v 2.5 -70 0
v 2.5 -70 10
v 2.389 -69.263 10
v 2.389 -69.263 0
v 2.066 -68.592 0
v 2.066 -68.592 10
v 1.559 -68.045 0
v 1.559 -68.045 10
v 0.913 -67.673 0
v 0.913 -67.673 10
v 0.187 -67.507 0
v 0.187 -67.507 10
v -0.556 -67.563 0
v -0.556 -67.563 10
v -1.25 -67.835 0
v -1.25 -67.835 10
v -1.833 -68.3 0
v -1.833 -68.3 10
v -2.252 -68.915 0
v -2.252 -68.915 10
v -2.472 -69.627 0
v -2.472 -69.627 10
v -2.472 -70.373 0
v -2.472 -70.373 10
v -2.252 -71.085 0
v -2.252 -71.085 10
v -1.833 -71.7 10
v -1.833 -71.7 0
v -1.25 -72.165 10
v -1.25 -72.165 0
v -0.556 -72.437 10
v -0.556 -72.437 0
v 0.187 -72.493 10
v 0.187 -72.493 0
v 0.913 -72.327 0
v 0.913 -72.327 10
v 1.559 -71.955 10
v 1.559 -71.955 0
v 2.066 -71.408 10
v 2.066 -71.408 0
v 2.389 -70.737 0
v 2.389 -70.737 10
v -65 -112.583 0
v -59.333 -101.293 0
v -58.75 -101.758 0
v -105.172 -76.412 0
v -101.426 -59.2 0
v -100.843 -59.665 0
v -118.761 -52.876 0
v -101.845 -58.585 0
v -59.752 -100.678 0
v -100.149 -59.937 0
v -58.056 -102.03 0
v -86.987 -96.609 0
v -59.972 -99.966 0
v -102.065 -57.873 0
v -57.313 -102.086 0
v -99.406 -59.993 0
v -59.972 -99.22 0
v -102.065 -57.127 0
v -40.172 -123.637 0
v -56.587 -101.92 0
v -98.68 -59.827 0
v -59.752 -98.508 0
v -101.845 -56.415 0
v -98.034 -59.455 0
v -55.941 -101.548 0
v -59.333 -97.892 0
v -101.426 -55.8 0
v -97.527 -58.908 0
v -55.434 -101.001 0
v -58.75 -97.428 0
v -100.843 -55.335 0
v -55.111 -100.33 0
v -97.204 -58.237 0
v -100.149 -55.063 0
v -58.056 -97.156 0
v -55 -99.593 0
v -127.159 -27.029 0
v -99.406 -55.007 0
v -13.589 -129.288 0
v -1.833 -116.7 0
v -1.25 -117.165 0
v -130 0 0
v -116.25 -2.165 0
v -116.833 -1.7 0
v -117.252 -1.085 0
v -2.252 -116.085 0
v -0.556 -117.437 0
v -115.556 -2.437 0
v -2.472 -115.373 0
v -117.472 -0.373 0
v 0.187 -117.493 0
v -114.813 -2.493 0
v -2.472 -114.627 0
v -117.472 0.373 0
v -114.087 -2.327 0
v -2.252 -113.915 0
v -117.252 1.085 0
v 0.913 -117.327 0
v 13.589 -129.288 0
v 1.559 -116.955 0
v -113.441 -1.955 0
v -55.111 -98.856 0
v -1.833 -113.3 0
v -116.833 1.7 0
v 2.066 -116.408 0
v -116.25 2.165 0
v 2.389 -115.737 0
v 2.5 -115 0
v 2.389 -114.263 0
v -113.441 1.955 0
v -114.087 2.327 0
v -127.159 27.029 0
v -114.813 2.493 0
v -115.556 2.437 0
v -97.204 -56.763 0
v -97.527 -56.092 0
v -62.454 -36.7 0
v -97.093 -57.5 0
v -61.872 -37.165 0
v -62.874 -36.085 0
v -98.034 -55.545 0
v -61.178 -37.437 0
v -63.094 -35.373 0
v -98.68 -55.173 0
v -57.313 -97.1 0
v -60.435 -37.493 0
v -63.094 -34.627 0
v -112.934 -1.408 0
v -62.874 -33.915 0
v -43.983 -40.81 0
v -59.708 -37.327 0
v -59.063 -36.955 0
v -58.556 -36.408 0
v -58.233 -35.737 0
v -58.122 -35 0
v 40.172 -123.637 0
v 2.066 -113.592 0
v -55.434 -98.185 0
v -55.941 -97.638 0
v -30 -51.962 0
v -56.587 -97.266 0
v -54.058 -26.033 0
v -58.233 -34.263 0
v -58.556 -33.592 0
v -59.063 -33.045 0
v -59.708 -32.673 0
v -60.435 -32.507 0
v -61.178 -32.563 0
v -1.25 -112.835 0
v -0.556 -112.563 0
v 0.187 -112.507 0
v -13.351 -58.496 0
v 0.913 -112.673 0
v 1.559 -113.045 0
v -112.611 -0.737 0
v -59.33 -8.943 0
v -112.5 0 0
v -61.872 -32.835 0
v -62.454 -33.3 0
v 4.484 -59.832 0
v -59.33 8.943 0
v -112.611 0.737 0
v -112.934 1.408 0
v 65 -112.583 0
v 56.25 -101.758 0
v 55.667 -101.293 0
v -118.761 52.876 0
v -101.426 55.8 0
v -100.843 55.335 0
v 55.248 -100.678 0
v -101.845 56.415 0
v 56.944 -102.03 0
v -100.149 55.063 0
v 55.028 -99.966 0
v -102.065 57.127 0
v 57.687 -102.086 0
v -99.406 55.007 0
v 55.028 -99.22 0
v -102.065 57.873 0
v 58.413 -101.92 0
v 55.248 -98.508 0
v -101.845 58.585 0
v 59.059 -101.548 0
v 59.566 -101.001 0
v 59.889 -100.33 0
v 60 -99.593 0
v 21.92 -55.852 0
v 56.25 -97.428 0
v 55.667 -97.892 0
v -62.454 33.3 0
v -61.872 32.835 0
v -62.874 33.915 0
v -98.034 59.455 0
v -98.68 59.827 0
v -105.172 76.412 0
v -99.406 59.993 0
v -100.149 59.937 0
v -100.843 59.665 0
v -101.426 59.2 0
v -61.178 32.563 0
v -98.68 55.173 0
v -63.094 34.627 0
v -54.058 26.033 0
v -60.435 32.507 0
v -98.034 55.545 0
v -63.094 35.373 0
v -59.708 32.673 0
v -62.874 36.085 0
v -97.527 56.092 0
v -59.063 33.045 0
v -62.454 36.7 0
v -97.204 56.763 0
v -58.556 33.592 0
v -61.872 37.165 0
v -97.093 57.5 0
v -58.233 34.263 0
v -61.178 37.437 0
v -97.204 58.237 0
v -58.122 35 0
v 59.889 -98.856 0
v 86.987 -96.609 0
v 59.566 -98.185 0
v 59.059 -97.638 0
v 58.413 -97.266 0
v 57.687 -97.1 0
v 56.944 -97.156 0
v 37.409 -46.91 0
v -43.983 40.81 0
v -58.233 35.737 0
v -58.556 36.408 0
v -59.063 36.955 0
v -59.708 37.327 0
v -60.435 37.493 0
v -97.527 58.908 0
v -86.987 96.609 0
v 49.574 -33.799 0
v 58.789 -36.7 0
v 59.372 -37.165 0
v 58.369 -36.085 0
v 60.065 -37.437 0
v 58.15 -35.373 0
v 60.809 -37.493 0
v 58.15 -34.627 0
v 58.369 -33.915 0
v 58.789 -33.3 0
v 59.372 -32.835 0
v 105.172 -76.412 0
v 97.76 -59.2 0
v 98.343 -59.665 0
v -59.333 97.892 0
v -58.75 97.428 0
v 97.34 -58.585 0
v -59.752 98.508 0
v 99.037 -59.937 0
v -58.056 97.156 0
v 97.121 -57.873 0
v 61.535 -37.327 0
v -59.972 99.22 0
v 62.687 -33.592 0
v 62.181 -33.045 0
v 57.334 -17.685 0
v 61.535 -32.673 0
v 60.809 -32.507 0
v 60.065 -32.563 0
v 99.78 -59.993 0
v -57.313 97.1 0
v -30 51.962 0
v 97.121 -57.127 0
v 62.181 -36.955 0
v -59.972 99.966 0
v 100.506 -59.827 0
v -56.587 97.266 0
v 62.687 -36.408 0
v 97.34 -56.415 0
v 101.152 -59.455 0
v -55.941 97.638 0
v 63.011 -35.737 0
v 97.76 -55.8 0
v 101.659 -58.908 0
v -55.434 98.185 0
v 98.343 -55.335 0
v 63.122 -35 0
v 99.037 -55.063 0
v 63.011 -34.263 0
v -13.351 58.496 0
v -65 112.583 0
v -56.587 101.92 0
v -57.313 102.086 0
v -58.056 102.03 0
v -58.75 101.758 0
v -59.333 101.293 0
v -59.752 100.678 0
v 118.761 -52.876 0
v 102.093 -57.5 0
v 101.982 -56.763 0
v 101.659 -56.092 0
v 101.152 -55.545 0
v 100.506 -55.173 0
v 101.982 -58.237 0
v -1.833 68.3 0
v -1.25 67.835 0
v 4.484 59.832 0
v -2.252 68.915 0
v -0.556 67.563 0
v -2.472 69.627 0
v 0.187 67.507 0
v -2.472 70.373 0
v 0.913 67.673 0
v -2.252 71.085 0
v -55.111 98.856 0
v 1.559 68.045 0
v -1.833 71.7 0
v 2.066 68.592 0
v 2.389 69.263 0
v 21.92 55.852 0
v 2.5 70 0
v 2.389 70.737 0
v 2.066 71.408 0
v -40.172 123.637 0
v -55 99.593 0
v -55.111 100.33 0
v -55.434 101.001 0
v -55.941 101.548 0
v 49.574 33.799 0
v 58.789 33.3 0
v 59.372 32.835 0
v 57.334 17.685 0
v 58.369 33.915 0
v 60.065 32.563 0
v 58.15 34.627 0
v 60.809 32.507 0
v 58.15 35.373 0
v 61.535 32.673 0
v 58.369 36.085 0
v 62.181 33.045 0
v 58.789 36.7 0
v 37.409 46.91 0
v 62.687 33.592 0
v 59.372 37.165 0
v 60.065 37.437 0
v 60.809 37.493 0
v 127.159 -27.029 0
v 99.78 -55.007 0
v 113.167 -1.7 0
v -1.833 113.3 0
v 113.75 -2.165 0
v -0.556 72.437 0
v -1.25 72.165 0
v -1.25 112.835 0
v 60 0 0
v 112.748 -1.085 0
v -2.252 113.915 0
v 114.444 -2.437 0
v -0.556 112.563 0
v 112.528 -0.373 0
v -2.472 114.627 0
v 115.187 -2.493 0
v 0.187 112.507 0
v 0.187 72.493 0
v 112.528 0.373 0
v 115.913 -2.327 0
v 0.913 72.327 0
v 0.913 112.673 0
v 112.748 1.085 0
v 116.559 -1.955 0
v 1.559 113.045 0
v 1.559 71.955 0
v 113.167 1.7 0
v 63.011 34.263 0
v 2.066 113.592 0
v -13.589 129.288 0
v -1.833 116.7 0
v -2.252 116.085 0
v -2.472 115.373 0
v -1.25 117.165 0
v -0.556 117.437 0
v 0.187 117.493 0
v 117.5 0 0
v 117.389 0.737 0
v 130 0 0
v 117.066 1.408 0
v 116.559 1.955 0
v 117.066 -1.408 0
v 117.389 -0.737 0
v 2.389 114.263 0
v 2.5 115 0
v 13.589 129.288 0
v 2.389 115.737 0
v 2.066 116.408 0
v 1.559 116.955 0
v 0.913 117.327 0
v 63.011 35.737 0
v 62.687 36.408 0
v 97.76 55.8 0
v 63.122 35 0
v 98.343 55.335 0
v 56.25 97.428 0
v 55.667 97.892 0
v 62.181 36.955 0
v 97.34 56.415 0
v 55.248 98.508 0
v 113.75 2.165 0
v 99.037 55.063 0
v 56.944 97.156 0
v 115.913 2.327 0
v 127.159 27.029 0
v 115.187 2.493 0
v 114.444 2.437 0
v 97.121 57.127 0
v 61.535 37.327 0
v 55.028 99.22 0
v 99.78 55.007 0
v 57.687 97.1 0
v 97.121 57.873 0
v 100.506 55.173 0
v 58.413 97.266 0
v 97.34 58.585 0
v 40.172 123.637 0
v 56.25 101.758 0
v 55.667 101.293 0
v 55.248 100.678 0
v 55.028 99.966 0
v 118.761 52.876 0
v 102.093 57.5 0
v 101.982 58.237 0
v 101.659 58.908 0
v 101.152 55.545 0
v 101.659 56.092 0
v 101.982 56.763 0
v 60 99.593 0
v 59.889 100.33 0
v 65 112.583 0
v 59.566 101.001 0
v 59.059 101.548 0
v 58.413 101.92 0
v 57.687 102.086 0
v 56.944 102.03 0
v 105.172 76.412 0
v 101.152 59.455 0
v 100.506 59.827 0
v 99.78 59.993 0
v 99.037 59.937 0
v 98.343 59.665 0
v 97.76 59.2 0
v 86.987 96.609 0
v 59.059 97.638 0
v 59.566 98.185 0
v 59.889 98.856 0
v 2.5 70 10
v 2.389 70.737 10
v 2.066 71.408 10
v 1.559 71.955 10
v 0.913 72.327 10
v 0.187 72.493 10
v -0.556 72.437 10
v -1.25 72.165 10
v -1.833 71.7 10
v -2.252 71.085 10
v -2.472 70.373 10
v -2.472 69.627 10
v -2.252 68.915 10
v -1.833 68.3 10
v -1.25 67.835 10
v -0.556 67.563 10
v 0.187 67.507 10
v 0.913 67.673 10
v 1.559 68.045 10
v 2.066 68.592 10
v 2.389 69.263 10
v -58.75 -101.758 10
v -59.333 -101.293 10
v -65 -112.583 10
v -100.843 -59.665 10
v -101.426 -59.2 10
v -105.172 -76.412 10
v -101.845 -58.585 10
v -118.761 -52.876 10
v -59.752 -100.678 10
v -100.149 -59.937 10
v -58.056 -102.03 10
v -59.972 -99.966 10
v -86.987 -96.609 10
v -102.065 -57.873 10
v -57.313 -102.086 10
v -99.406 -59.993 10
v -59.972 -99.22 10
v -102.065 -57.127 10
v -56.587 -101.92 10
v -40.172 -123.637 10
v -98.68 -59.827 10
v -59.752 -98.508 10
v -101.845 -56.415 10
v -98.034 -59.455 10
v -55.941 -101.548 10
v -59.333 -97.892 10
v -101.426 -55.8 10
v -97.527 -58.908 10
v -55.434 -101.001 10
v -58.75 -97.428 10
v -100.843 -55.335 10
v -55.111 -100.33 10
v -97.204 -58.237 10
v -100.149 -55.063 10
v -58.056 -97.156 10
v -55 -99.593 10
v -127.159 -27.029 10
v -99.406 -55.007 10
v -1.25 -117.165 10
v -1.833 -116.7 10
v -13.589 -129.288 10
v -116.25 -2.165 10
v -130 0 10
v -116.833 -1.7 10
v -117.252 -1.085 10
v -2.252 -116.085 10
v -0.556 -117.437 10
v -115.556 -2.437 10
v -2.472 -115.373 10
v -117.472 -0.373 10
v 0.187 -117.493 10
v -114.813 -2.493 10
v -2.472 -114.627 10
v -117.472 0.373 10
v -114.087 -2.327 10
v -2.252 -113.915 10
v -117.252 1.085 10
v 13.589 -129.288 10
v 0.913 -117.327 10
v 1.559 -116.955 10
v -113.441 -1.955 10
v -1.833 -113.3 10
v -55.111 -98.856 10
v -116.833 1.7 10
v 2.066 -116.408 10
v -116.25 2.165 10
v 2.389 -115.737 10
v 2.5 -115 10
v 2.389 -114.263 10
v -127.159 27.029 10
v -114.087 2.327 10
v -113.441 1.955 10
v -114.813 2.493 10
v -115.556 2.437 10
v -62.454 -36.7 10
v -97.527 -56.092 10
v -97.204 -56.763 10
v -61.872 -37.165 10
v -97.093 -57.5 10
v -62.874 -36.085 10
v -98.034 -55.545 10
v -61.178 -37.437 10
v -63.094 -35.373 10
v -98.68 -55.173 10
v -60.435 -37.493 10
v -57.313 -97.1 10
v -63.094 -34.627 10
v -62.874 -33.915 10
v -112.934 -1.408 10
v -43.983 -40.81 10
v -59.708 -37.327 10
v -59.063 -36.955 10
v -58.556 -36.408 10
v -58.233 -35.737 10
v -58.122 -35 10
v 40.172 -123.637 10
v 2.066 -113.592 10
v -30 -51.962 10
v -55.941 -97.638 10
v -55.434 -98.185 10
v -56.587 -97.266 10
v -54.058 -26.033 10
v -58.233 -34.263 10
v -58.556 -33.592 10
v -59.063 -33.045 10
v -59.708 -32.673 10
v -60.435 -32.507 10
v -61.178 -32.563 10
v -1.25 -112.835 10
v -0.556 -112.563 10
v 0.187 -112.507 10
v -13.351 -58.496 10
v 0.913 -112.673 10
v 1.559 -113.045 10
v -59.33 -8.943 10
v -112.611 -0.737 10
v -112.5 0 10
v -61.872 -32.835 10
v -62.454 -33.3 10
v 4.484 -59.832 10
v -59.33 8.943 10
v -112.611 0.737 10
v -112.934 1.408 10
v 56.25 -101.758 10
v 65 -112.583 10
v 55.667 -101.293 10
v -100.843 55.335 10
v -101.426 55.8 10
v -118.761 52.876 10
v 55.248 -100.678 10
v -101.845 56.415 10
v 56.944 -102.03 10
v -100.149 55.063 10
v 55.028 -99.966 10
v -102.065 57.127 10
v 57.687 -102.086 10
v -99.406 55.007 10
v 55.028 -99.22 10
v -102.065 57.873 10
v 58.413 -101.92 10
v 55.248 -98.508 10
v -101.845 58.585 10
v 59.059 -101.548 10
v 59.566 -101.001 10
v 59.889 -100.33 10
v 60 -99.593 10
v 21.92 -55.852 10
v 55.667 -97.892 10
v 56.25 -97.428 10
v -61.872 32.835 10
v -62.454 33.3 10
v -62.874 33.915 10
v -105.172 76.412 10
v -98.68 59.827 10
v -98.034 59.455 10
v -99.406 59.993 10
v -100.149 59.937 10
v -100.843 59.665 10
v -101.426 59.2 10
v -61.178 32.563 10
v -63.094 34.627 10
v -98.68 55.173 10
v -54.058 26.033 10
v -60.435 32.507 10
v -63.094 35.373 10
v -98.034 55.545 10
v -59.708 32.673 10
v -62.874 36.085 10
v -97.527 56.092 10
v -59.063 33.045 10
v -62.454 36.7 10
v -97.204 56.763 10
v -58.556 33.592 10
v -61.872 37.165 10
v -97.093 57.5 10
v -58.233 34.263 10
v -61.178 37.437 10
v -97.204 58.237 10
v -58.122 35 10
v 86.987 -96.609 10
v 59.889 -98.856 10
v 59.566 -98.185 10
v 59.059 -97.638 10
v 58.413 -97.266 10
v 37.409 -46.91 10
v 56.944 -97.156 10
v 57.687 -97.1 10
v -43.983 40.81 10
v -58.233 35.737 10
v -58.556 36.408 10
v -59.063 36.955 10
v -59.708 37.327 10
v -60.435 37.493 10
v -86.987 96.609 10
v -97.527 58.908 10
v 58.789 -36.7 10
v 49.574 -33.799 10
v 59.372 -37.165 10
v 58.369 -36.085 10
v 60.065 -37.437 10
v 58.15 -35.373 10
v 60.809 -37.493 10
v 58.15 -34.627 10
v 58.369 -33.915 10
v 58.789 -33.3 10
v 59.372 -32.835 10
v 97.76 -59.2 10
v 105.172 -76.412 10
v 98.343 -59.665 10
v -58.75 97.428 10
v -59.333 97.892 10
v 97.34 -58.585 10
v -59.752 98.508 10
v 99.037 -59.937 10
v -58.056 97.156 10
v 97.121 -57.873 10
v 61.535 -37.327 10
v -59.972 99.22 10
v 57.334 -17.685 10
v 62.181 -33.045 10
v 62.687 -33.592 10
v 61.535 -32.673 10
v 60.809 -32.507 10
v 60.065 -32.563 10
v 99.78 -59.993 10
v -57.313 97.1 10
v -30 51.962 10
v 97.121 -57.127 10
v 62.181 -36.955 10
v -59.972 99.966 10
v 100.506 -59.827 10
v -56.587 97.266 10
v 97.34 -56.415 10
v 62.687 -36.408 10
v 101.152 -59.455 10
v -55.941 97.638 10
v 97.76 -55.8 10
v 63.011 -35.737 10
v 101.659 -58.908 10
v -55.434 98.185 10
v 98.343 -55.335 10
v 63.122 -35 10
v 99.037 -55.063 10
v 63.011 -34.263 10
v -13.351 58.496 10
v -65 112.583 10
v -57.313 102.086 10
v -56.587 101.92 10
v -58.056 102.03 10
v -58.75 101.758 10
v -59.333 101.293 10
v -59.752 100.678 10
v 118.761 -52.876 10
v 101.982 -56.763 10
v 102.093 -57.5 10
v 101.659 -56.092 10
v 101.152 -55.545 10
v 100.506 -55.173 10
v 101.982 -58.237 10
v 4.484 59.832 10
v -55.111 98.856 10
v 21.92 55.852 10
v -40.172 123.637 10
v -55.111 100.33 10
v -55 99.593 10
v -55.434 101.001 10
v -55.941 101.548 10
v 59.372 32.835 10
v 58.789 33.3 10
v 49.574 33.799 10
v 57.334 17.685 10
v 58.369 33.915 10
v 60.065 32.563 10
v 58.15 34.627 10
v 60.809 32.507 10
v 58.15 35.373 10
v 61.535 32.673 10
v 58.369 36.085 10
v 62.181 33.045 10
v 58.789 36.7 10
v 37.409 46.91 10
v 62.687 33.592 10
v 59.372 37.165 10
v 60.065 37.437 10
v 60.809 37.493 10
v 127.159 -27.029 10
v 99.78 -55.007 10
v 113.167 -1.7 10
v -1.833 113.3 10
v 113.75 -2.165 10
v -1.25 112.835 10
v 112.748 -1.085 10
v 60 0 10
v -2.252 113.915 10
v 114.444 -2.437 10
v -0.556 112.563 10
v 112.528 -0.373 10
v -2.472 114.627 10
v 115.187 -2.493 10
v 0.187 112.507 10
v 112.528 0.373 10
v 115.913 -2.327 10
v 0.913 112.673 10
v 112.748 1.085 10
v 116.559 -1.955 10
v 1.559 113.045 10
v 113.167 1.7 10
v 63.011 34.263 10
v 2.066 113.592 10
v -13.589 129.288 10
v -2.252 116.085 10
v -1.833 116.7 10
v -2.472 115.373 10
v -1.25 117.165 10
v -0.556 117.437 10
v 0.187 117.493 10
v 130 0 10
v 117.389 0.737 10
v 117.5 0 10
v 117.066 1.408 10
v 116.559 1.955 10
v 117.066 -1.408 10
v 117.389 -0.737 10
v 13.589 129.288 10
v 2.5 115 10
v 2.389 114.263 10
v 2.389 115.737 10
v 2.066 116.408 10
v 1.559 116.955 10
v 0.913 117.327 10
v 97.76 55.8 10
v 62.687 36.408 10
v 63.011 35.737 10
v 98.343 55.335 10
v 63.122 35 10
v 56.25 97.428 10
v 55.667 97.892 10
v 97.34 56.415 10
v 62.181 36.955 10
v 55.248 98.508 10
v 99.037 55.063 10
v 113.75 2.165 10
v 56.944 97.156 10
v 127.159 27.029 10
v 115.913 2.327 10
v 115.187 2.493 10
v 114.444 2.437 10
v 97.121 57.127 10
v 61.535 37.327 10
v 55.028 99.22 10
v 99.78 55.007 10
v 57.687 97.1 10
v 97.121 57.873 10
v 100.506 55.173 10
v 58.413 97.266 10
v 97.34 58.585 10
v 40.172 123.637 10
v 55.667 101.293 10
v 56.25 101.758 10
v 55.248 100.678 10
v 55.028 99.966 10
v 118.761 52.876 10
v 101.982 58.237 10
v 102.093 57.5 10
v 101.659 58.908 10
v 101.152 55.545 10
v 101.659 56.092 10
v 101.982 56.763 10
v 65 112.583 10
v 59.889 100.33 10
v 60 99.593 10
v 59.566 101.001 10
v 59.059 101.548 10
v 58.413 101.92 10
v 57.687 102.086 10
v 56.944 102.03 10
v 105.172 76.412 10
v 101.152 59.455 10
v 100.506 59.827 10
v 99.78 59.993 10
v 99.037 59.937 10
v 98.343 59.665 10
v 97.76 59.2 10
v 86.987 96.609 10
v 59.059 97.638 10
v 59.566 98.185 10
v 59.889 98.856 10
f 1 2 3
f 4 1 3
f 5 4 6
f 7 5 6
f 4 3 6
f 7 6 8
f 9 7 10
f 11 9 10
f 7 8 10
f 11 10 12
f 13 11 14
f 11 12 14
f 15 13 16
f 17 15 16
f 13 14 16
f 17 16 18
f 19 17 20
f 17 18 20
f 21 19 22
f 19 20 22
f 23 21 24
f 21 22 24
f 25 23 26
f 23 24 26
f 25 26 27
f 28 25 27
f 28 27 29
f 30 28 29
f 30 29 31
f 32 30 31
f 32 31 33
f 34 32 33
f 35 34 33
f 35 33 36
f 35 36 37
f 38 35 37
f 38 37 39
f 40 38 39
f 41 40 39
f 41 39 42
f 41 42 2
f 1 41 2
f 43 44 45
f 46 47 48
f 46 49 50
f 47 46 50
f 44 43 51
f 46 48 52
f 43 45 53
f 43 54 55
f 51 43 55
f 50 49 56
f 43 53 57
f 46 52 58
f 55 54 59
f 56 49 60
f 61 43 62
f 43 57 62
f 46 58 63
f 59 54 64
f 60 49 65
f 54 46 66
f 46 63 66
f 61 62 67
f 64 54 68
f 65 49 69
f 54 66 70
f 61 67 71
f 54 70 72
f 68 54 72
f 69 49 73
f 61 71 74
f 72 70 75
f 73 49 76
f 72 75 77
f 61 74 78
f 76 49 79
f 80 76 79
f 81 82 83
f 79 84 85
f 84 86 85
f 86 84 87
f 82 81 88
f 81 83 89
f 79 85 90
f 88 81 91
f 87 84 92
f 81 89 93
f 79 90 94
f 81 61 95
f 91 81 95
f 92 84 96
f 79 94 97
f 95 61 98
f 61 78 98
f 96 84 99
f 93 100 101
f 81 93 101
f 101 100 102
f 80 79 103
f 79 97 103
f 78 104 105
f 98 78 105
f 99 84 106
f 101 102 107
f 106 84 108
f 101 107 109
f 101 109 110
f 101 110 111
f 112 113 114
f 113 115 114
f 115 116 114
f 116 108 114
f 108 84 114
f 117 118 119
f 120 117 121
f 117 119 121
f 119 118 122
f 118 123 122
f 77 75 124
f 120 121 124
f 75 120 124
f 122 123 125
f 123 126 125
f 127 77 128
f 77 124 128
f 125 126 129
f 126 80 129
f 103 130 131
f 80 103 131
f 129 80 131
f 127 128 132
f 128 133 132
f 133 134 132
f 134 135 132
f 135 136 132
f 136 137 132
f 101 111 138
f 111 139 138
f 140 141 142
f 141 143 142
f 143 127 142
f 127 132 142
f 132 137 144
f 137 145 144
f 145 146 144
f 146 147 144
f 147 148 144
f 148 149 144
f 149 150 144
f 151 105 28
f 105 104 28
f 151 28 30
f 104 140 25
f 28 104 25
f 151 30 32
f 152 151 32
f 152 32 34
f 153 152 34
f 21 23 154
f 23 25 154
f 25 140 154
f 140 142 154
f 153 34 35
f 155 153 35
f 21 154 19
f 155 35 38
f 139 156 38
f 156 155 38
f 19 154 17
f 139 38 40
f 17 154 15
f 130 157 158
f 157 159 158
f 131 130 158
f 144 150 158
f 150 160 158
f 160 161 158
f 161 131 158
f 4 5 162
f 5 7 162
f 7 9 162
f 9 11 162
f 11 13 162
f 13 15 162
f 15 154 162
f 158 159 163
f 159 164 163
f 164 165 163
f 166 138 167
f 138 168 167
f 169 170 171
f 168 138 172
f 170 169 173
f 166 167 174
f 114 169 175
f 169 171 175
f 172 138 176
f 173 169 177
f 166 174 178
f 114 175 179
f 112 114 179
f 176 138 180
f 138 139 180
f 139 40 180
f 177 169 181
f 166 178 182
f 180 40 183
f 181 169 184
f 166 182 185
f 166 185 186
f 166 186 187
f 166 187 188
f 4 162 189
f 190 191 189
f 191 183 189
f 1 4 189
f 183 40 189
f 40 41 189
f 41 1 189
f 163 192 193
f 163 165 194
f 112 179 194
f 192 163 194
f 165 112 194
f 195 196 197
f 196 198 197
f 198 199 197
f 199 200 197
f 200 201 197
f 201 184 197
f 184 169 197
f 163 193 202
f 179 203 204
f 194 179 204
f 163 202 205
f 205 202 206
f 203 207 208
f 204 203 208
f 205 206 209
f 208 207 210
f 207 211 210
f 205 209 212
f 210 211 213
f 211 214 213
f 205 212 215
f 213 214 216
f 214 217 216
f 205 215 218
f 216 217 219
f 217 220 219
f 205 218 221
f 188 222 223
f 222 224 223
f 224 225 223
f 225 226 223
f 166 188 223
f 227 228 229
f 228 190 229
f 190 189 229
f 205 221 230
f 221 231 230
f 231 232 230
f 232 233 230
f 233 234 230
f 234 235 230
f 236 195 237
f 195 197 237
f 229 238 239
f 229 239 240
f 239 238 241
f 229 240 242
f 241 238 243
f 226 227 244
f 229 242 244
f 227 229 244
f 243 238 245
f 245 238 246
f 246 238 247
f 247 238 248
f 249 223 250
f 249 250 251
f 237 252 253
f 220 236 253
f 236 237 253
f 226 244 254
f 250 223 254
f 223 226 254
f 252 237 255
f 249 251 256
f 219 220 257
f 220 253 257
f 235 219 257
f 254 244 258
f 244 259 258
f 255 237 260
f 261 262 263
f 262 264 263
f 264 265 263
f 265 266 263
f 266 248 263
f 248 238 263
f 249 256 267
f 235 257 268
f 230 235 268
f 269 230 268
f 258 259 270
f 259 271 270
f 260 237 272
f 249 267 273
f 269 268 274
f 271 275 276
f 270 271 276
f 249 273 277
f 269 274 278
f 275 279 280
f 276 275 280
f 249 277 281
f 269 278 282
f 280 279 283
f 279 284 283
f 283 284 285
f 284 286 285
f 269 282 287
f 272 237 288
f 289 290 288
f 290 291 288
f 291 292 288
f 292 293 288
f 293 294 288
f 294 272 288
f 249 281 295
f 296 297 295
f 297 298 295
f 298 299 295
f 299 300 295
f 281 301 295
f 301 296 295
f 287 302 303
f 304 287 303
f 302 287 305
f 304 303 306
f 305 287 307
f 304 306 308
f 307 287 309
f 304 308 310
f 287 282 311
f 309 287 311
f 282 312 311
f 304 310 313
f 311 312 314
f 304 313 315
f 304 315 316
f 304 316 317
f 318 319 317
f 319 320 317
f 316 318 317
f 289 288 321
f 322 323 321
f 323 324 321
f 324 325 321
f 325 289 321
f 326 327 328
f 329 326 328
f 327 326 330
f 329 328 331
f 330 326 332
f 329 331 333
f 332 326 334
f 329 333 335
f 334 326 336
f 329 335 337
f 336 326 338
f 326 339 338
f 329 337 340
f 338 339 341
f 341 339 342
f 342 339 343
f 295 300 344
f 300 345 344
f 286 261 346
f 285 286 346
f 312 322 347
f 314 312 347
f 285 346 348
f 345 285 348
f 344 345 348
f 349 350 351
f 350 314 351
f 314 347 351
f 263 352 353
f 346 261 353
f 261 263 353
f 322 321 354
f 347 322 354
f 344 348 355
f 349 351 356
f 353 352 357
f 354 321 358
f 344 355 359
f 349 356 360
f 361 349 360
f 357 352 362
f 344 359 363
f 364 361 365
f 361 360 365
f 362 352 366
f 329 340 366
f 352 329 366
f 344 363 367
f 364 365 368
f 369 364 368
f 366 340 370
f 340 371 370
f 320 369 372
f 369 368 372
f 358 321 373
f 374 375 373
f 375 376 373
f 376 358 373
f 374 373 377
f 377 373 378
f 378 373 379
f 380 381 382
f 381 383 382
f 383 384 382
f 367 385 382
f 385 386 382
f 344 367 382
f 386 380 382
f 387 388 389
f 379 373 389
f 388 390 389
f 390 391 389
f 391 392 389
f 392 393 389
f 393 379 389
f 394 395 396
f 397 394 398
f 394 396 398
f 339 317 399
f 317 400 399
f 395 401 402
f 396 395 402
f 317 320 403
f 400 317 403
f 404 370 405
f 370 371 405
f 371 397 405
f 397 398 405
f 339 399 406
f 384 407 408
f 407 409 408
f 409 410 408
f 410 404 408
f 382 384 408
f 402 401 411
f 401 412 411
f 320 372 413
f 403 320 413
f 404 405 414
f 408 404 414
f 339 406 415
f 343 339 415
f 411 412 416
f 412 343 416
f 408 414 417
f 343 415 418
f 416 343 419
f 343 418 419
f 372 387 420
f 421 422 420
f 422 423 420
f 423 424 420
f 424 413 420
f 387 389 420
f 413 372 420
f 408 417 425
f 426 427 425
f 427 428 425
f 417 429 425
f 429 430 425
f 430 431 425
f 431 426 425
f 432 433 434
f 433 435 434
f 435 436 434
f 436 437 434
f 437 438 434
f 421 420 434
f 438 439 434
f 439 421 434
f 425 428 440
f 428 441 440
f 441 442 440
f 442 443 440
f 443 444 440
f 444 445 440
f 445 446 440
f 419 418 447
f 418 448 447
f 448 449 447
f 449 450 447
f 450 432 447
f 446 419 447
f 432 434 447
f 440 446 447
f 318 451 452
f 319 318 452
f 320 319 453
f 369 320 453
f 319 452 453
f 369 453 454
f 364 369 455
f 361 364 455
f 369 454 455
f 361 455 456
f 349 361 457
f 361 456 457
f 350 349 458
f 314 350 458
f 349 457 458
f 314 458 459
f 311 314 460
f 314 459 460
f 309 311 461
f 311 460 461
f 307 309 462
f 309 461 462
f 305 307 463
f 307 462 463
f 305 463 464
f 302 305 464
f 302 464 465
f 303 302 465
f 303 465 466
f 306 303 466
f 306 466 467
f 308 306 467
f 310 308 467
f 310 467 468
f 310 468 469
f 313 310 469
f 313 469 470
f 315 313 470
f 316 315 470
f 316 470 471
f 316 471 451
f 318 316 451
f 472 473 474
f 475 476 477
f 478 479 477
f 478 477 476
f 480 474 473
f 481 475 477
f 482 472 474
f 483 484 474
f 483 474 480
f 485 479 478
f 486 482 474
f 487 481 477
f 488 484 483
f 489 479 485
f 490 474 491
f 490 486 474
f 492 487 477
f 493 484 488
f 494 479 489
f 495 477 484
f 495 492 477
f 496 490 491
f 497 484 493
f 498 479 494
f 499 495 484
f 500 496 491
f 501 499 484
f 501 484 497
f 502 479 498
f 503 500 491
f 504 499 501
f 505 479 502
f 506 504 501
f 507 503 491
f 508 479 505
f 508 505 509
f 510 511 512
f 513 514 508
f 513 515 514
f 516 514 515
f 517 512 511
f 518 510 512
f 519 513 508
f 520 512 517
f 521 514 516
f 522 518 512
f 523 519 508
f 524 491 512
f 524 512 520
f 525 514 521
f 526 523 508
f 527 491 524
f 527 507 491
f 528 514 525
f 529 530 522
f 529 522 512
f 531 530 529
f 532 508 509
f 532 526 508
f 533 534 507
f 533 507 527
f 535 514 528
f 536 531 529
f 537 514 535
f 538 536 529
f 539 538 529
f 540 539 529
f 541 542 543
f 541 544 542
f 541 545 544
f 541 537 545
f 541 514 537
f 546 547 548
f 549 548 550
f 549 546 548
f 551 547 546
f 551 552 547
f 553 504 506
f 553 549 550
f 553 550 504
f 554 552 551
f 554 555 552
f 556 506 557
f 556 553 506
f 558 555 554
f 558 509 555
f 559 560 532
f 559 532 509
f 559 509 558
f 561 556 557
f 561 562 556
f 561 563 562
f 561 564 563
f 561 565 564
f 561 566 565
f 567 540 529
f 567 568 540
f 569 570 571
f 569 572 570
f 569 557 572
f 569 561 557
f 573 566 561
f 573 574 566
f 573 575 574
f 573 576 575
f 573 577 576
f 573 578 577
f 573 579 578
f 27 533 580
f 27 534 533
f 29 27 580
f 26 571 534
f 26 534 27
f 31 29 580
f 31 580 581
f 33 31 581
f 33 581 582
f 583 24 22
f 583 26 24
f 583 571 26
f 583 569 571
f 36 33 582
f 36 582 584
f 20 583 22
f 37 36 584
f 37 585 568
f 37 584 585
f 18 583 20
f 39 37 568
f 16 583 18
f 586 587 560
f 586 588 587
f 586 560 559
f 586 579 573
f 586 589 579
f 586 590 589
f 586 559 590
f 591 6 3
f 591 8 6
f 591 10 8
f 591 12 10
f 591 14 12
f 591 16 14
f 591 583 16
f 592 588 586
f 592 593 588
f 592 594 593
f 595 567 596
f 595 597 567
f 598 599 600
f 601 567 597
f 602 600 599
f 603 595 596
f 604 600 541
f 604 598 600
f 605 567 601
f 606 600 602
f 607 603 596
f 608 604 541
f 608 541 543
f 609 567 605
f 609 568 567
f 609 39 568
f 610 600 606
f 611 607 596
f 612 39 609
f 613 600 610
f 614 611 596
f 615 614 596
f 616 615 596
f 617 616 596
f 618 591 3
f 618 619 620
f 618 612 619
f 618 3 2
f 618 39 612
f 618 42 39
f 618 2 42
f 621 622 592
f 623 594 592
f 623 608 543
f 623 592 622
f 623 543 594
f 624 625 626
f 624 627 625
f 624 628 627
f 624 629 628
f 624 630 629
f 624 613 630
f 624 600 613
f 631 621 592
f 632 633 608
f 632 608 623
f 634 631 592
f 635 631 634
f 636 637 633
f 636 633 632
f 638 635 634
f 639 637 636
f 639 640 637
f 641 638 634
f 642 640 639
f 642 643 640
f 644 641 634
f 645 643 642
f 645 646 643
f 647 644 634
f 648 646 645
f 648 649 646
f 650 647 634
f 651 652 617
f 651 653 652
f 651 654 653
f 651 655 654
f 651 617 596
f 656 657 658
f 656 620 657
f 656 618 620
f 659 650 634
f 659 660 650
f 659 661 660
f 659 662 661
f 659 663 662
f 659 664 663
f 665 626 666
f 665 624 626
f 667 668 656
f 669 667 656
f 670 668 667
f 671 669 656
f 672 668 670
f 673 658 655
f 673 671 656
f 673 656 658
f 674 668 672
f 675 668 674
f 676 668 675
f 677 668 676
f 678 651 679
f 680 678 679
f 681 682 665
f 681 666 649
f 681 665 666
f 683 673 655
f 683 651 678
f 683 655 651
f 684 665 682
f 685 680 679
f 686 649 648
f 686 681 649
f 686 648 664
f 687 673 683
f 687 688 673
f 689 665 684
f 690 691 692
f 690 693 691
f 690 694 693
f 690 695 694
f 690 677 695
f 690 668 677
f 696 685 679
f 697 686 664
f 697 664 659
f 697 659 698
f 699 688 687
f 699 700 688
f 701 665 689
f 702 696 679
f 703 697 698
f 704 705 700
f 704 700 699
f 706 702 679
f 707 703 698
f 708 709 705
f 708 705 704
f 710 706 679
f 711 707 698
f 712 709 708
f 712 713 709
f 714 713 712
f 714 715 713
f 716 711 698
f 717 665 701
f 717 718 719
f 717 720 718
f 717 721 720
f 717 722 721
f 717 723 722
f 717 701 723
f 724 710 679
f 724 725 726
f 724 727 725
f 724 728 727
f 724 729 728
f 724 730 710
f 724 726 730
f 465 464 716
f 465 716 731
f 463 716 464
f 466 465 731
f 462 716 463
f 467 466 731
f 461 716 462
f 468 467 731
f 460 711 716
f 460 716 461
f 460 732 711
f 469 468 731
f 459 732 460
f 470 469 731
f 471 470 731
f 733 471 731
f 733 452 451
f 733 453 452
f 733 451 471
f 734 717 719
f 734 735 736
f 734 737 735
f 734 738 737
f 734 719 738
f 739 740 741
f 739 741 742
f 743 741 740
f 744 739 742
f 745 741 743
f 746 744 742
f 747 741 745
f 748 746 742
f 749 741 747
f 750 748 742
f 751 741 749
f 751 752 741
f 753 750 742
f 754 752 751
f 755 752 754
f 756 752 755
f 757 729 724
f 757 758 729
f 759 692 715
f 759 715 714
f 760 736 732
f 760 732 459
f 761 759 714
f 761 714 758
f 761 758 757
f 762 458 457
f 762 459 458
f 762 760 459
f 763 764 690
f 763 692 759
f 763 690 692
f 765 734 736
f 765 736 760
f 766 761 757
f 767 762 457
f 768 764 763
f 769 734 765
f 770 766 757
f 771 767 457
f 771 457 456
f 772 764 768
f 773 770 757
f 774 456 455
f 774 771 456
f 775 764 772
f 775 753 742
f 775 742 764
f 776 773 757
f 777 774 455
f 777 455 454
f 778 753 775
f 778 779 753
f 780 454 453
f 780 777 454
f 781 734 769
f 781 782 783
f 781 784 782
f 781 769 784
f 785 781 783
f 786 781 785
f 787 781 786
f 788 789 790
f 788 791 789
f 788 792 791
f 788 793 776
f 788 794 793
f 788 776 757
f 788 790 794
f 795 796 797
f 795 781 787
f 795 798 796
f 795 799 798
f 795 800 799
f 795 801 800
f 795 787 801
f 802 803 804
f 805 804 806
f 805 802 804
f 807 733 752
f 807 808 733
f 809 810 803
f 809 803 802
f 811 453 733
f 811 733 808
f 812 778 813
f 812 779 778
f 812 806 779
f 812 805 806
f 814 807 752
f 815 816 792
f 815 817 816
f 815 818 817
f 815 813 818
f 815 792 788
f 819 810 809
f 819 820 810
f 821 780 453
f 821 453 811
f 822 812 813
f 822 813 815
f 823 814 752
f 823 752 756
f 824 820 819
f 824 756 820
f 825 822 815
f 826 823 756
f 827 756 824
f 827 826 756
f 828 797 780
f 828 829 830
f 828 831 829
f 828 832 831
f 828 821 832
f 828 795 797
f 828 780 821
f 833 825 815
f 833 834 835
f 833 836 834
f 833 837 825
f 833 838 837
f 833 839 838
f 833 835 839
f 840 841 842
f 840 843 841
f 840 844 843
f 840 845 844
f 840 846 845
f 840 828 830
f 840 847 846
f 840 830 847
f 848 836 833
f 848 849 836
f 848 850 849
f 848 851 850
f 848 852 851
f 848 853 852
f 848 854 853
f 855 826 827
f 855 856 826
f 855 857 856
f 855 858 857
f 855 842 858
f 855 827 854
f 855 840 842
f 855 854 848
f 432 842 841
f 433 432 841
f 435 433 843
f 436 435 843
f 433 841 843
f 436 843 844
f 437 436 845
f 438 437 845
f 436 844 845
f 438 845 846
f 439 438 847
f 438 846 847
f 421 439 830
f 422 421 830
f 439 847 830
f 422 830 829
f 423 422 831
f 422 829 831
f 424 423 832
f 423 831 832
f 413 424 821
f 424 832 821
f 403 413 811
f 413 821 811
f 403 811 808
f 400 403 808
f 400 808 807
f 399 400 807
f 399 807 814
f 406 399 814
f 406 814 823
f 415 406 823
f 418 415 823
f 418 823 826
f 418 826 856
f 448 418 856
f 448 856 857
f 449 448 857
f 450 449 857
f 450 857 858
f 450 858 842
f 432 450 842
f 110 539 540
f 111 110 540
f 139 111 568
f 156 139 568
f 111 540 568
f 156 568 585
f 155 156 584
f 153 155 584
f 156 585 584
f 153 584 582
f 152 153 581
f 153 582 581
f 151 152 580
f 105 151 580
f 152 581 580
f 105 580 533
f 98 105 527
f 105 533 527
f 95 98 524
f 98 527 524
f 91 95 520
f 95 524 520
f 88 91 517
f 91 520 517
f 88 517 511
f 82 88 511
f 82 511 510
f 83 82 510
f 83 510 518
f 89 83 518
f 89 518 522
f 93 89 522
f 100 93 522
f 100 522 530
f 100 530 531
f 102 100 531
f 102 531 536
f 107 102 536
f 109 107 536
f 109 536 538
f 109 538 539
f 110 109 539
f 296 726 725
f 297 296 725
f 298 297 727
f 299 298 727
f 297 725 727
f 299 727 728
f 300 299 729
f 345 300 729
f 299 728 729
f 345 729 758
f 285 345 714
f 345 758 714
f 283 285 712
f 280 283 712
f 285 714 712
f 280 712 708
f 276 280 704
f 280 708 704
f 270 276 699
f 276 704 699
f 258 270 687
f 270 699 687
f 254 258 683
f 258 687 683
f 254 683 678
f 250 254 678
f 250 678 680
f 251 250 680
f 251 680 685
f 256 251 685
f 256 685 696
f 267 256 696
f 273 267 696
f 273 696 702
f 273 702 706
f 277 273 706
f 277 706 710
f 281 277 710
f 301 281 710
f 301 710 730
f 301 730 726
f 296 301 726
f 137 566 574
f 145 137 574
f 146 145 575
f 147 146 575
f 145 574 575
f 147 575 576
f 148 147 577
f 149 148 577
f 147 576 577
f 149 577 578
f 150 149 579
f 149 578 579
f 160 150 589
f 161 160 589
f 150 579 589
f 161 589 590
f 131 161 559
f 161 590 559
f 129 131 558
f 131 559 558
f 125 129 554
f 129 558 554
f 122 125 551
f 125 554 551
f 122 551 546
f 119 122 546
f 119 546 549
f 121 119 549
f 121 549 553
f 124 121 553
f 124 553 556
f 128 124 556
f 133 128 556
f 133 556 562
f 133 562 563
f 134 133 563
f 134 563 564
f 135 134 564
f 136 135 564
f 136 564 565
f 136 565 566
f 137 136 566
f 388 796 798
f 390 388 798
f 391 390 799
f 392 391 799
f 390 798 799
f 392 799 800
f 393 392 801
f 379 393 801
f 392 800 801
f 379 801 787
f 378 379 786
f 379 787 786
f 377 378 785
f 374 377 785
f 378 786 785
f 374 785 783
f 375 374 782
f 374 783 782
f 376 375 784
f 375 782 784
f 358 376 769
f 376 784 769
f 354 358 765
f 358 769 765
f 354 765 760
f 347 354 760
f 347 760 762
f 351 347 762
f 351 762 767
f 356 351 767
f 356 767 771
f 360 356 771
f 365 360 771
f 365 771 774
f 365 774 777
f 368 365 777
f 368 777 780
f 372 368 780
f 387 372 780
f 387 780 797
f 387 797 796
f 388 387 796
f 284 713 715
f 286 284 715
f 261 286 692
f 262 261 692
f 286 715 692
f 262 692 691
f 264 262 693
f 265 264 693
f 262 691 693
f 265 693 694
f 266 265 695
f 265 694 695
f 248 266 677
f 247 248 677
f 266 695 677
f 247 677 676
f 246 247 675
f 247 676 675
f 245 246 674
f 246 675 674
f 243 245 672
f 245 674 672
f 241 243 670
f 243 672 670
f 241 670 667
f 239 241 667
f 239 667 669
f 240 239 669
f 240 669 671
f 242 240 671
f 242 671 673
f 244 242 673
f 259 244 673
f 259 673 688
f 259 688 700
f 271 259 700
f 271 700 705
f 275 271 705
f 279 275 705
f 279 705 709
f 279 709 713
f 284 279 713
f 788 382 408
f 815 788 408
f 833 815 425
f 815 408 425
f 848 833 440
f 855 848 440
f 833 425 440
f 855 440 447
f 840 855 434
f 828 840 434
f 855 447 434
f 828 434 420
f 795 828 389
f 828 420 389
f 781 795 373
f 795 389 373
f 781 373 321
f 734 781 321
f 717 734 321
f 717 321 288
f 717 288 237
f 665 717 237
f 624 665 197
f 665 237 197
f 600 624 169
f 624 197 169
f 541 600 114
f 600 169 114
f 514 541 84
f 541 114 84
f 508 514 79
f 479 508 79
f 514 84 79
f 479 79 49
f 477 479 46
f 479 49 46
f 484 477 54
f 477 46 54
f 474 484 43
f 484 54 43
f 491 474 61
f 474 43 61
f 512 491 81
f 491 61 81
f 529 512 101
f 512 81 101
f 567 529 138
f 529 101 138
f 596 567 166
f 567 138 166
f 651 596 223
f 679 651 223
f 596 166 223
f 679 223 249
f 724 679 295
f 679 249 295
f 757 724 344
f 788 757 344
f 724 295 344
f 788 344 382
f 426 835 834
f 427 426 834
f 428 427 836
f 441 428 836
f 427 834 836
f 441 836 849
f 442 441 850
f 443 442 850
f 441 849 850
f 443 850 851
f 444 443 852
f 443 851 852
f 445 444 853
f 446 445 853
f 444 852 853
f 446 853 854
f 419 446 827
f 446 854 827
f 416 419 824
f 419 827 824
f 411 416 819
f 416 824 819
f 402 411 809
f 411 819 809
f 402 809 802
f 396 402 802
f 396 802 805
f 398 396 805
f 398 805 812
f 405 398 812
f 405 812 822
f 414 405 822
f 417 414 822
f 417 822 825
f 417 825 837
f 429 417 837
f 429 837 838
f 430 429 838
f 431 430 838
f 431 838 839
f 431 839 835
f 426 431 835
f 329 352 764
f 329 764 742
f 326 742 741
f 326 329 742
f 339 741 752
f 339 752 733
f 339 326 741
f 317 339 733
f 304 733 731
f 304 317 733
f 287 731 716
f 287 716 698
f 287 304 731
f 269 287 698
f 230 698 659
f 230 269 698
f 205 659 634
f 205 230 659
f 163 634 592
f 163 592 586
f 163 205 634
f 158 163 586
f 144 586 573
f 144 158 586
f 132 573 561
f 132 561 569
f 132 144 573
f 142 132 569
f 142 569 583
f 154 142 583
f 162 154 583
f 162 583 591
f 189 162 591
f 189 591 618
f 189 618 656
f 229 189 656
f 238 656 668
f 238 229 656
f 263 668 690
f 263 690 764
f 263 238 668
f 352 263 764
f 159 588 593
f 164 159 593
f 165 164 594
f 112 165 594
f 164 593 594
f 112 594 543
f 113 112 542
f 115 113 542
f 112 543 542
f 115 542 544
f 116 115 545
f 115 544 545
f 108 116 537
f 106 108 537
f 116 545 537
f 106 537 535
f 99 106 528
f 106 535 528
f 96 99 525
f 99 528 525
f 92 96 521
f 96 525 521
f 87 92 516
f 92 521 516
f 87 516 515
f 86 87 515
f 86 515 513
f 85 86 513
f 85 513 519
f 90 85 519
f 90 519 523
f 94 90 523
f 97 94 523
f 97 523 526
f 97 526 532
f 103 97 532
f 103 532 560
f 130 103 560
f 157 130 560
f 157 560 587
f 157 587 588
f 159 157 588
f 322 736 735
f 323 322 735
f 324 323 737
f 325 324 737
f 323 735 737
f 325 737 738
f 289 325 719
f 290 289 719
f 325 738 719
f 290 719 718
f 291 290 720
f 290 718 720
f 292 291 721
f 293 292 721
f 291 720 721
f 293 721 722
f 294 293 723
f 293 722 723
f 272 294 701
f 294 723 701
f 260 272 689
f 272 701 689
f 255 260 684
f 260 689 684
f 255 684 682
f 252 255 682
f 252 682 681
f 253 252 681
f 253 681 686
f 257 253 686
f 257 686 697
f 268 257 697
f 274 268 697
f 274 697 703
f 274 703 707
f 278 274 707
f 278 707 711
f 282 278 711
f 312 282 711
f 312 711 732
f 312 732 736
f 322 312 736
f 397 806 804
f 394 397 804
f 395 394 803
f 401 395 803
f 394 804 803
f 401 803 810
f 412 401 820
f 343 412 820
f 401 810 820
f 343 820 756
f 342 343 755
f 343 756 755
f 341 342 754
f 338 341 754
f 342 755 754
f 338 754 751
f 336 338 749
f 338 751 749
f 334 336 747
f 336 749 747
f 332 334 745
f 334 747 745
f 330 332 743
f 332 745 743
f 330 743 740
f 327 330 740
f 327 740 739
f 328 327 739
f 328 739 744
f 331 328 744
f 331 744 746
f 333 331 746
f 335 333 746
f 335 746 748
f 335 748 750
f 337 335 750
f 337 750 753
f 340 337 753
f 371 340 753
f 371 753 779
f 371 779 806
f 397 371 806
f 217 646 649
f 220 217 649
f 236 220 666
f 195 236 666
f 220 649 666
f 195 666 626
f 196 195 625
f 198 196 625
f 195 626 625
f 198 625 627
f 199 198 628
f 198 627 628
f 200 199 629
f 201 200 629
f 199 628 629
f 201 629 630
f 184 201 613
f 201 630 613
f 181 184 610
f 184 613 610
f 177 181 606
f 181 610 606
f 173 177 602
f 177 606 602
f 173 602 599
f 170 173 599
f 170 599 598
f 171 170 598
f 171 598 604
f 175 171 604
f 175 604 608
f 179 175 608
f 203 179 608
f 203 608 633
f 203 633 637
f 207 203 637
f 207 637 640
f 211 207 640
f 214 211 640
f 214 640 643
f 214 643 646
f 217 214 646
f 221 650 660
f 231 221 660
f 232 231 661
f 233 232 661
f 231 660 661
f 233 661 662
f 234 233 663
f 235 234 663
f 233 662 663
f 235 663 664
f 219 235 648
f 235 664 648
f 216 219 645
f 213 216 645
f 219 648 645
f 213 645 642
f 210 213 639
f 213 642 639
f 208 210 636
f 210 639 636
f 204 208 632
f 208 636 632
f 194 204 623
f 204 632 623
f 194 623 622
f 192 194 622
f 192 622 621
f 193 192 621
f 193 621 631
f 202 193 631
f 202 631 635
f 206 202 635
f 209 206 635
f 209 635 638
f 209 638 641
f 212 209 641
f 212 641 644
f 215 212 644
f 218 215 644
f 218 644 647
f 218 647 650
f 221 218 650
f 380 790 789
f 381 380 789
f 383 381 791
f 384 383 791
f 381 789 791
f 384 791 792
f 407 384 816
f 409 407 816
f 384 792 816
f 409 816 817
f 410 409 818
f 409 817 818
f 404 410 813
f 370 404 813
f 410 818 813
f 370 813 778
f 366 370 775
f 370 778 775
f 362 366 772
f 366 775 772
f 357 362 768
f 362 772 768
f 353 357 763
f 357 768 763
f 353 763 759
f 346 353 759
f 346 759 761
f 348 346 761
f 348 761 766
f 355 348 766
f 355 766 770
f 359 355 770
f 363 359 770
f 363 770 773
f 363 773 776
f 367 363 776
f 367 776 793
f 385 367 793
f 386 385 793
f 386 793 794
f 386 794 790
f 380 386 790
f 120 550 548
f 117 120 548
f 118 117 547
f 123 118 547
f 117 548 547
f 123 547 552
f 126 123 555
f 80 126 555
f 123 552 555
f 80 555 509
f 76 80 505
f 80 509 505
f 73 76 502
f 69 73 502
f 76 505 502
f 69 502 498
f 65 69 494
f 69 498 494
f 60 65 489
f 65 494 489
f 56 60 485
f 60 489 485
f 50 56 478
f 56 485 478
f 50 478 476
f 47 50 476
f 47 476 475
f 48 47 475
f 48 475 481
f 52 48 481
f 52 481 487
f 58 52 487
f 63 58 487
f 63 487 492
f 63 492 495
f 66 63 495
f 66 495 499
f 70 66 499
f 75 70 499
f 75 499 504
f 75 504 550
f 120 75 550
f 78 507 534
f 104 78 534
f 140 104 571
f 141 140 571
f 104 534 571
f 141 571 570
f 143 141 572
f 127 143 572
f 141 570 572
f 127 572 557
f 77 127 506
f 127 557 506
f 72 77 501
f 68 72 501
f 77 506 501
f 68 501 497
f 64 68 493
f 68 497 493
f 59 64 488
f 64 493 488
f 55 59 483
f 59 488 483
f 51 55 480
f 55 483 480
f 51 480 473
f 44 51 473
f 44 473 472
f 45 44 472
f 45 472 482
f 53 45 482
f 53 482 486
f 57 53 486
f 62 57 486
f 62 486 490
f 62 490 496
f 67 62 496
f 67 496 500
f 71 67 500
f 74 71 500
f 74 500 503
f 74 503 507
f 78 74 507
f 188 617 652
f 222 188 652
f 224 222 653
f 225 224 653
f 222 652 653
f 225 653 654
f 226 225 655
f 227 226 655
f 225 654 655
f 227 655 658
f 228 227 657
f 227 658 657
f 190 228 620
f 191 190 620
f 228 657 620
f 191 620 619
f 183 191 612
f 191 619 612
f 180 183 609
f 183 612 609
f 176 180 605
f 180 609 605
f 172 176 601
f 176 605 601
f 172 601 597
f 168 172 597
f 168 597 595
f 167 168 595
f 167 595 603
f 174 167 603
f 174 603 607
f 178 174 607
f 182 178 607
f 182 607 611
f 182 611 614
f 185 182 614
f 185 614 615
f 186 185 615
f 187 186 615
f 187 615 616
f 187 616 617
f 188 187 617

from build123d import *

# Parameters (mm, degrees)
SKETCH_1_R          = 130
SKETCH_1_R_2        = 60
EXTRUDE_1_DEPTH     = 10
SKETCH_2_R          = 2.5
CUT_EXTRUDE_1_DEPTH = 185.119526395
SKETCH_3_R          = 2.5
CUT_EXTRUDE_2_DEPTH = 185.119526395


with BuildPart() as part:
    # 草图1 → 凸台-拉伸1 (new body)
    with BuildSketch(Plane.XY):
        Circle(SKETCH_1_R)
        Circle(SKETCH_1_R_2, mode=Mode.SUBTRACT)
    extrude(amount=EXTRUDE_1_DEPTH)

    # 草图2 → 切除-拉伸1 (cut, through all)
    with BuildSketch(Plane.XY.offset(10)):
        with Locations((0, 70)):
            Circle(SKETCH_2_R)
        with Locations((60.621778265, 35)):
            Circle(SKETCH_2_R)
        with Locations((60.621778265, -35)):
            Circle(SKETCH_2_R)
        with Locations((0, -70)):
            Circle(SKETCH_2_R)
        with Locations((-60.621778265, -35)):
            Circle(SKETCH_2_R)
        with Locations((-60.621778265, 35)):
            Circle(SKETCH_2_R)
    extrude(amount=-CUT_EXTRUDE_1_DEPTH, mode=Mode.SUBTRACT)

    # 草图3 → 切除-拉伸2 (cut, through all)
    with BuildSketch(Plane.XY.offset(10)):
        with Locations((0, 115)):
            Circle(SKETCH_3_R)
        with Locations((57.5, 99.592921435)):
            Circle(SKETCH_3_R)
        with Locations((99.592921435, 57.5)):
            Circle(SKETCH_3_R)
        with Locations((115, 0)):
            Circle(SKETCH_3_R)
        with Locations((99.592921435, -57.5)):
            Circle(SKETCH_3_R)
        with Locations((57.5, -99.592921435)):
            Circle(SKETCH_3_R)
        with Locations((0, -115)):
            Circle(SKETCH_3_R)
        with Locations((-57.5, -99.592921435)):
            Circle(SKETCH_3_R)
        with Locations((-99.592921435, -57.5)):
            Circle(SKETCH_3_R)
        with Locations((-115, 0)):
            Circle(SKETCH_3_R)
        with Locations((-99.592921435, 57.5)):
            Circle(SKETCH_3_R)
        with Locations((-57.5, 99.592921435)):
            Circle(SKETCH_3_R)
    extrude(amount=-CUT_EXTRUDE_2_DEPTH, mode=Mode.SUBTRACT)


solid = part.part
